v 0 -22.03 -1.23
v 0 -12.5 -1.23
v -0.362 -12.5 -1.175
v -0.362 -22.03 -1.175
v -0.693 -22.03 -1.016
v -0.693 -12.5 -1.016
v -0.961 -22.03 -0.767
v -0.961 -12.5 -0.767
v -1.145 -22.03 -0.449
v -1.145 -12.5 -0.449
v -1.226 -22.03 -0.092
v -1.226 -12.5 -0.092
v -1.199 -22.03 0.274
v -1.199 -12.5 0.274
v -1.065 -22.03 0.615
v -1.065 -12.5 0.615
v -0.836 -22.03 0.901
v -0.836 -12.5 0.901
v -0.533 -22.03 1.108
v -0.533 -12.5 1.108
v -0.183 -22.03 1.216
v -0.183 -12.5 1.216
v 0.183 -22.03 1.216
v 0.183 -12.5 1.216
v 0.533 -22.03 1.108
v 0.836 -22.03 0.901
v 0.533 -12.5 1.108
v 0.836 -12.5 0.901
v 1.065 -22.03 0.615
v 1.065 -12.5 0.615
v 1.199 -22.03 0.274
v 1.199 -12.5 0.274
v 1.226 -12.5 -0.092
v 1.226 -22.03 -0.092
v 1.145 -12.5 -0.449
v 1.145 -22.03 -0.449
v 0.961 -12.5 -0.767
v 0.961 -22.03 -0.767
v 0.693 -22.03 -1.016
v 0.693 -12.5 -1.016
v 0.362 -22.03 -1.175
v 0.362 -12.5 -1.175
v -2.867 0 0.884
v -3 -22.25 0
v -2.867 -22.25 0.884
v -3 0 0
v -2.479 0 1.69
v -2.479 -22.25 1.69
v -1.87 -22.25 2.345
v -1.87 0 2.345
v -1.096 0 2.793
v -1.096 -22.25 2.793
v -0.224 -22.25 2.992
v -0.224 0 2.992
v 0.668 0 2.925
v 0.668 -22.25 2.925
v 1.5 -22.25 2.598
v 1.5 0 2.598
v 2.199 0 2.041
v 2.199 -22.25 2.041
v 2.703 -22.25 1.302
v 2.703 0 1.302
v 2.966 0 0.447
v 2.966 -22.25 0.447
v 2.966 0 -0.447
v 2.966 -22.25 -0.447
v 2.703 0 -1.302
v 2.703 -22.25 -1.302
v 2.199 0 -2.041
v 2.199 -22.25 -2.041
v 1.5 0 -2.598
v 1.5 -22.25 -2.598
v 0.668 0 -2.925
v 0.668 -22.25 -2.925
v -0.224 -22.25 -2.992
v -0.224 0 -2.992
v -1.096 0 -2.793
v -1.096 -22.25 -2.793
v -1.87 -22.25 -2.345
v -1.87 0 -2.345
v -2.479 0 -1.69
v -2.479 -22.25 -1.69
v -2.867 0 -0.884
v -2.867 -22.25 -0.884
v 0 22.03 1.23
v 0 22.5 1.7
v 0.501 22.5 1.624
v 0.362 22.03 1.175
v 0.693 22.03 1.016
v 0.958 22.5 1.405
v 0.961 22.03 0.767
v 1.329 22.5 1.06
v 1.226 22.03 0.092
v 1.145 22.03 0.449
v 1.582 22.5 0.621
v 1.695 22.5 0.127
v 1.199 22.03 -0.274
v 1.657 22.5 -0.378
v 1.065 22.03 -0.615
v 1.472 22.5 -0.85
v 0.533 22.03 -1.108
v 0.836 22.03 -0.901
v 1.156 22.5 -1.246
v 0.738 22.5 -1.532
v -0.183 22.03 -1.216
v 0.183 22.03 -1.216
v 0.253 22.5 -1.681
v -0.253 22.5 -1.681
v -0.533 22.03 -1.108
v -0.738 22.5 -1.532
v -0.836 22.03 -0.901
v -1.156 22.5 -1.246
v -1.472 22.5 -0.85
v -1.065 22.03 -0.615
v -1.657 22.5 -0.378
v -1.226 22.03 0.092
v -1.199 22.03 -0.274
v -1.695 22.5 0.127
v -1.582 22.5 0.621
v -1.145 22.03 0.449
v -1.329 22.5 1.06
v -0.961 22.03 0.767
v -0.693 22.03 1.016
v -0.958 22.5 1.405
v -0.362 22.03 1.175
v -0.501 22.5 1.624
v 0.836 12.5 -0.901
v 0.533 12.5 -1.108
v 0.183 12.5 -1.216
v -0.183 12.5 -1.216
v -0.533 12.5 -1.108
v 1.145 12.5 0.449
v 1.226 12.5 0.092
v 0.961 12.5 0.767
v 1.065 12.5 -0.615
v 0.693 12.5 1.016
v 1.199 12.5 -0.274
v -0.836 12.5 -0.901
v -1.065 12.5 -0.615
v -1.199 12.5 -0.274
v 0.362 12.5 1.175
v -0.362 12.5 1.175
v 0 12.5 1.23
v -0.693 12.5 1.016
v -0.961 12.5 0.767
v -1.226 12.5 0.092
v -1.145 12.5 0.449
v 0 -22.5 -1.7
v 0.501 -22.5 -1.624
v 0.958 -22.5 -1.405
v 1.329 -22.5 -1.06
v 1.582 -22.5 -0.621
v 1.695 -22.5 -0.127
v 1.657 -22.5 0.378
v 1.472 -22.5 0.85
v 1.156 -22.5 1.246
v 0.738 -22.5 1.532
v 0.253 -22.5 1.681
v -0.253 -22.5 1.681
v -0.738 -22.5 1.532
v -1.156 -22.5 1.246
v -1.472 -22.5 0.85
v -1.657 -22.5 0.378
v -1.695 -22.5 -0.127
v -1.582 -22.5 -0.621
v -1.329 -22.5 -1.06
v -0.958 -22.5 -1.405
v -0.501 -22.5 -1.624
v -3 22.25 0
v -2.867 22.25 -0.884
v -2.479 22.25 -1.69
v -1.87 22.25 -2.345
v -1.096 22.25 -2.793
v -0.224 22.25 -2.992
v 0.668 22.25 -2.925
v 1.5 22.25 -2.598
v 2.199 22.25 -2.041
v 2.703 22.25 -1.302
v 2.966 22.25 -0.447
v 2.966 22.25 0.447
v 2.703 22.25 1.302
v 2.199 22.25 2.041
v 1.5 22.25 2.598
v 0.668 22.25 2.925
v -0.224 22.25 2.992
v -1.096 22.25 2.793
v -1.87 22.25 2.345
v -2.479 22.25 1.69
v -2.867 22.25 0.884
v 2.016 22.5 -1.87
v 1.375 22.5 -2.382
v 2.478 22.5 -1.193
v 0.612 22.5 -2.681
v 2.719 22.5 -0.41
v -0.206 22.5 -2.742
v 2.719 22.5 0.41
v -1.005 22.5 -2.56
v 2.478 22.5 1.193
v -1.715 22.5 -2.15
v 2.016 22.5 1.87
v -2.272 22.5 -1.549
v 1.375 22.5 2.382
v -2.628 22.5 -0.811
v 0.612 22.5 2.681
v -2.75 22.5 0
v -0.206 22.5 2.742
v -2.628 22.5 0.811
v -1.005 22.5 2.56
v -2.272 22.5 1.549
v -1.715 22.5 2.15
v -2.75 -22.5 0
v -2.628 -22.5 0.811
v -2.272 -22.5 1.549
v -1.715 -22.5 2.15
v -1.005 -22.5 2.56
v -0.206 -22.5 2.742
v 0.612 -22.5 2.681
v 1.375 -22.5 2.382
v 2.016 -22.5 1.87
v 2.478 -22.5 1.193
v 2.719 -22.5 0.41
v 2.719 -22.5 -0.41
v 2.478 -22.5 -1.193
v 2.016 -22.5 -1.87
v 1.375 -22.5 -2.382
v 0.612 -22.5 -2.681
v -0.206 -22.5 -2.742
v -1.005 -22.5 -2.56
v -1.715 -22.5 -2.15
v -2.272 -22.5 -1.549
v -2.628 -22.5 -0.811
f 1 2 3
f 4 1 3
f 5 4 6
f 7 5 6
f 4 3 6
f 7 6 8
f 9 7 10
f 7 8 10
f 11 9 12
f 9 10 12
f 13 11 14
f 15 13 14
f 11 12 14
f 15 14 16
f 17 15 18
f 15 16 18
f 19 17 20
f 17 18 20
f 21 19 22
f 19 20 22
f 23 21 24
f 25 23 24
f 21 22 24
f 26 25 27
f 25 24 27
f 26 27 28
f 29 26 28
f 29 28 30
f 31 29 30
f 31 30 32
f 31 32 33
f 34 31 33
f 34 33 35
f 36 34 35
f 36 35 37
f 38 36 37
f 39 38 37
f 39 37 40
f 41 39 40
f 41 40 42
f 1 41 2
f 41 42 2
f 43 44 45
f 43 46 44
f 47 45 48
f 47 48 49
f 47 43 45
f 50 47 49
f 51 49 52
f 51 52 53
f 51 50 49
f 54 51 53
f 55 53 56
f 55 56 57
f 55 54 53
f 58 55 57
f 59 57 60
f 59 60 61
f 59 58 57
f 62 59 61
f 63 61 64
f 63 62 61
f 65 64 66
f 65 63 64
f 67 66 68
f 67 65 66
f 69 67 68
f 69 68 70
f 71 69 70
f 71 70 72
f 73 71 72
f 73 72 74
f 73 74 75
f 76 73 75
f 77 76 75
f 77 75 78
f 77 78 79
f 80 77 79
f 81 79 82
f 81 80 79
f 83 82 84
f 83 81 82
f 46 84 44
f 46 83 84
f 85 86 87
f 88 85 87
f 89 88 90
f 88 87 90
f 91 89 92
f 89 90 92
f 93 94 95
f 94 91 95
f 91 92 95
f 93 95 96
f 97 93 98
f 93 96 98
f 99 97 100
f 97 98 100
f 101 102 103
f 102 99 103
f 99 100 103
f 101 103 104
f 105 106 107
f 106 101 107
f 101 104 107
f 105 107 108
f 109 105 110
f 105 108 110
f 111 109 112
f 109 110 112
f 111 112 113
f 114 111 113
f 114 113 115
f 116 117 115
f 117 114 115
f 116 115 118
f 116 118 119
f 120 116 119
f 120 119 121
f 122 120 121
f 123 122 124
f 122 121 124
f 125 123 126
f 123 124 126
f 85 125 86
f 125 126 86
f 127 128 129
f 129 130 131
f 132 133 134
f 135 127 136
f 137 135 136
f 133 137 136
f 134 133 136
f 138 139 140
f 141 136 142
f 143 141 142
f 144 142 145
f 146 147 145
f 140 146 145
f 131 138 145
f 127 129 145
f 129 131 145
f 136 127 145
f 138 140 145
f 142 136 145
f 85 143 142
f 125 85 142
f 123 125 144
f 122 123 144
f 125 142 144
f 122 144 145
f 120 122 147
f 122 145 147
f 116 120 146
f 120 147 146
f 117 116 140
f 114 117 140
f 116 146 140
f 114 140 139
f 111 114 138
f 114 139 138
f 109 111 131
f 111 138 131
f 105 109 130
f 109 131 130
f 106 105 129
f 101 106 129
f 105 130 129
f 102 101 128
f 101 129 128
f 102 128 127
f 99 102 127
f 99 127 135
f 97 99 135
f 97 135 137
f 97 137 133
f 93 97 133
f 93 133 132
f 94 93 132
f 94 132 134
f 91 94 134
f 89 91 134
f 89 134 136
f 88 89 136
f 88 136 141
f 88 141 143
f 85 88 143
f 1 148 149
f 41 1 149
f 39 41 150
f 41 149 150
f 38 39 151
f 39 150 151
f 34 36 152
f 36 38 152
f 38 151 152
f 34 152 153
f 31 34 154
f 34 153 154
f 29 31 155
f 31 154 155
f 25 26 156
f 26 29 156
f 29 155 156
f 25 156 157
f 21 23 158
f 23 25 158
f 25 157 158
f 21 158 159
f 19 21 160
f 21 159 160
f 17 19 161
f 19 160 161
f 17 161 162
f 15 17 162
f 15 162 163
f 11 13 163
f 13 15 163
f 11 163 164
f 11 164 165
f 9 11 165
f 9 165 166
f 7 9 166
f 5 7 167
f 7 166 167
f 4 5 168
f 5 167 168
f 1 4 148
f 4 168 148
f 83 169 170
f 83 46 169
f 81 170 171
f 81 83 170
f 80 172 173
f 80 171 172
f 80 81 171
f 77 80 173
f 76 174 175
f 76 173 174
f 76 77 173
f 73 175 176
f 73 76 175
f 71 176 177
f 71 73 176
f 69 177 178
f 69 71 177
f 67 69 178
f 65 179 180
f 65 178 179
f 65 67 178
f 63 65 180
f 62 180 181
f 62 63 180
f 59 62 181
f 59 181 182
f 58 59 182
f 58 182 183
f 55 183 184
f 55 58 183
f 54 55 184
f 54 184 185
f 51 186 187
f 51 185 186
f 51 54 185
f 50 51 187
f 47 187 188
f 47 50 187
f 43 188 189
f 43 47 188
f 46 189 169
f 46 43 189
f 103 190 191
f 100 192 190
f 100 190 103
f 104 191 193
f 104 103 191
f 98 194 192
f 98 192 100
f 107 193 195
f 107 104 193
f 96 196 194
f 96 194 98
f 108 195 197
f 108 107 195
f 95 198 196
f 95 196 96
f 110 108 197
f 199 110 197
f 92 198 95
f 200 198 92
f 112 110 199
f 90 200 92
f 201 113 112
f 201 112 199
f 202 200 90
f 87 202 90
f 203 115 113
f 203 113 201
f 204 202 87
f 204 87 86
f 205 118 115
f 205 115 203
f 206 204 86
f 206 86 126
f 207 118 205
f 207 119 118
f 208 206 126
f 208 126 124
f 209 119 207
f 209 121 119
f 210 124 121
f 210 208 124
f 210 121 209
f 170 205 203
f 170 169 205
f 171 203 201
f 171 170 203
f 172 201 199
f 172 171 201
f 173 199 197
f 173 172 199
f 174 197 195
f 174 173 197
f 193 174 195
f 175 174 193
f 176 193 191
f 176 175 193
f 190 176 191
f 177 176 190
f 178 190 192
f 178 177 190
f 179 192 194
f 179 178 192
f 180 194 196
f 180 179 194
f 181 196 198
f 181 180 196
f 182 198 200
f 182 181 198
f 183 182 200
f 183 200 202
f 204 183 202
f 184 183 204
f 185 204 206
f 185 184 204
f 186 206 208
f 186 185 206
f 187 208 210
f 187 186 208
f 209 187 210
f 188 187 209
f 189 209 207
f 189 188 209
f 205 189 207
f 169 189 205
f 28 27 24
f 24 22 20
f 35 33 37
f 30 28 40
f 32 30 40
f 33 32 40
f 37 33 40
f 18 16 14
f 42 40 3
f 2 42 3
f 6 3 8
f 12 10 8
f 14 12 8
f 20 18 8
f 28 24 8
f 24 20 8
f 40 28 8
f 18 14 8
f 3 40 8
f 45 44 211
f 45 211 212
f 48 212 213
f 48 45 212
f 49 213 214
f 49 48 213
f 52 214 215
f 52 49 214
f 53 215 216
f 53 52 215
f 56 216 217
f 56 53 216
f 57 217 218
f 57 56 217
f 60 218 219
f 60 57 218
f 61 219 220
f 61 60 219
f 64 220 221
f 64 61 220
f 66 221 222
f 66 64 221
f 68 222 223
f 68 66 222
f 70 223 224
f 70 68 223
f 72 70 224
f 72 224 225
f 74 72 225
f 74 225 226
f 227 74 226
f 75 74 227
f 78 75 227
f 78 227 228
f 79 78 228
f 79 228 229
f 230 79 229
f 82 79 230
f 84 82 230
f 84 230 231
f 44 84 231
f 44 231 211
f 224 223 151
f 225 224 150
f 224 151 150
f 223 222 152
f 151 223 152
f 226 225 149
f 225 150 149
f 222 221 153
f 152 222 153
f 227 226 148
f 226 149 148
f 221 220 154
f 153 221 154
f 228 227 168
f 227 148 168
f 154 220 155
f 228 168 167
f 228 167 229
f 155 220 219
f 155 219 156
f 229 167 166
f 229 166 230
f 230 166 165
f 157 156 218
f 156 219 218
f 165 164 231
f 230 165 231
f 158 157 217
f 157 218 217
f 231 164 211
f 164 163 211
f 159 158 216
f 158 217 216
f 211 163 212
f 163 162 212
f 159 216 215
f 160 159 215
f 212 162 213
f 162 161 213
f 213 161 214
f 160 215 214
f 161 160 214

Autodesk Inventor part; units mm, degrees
ref_plane "YZ Plane" through (0, 0, 0) normal (1, 0, 0) x (0, 1, 0)
ref_plane "XZ Plane" through (0, 0, 0) normal (0, 1, 0) x (-1, 0, 0)
ref_plane "XY Plane" through (0, 0, 0) normal (0, 0, 1) x (1, 0, 0)
sketch "スケッチ1" plane through (0, 0, 0) normal (0, 1, 0) x (-1, 0, 0)
  circle A0 centre (0, 0) radius 3
  dimension "d0" = 6
extrude "押し出し1" add sketch "スケッチ1" along normal mid plane 45
sketch "スケッチ2" plane through (0, 22.5, 0) normal (0, 1, 0) x (1, 0, 0)
  point P0 (0, 0)
  point P1 (0, 0)
hole "穴1" at (0, 22.5, 0) direction (0, -1, 0) diameter 2.459 depth 10 countersink diameter 3.4 countersink angle 90 thread size "M3x0.5" class "6H" standard "ISO Metric profile"
sketch "スケッチ3" plane through (0, -22.5, 0) normal (0, -1, 0) x (1, 0, 0)
  point P0 (0, 0)
  point P1 (0, 0)
hole "穴2" at (0, -22.5, 0) direction (0, 1, 0) diameter 2.459 depth 10 countersink diameter 3.4 countersink angle 90 thread size "M3x0.5" class "6H" standard "ISO Metric profile"
chamfer "面取り1" distance 0.25 angle 45 2 edges at (3, -22.5, 0) (3, 22.5, 0)
properties part number "Spacer_M3D6L45" material "アルミニウム 6061"
